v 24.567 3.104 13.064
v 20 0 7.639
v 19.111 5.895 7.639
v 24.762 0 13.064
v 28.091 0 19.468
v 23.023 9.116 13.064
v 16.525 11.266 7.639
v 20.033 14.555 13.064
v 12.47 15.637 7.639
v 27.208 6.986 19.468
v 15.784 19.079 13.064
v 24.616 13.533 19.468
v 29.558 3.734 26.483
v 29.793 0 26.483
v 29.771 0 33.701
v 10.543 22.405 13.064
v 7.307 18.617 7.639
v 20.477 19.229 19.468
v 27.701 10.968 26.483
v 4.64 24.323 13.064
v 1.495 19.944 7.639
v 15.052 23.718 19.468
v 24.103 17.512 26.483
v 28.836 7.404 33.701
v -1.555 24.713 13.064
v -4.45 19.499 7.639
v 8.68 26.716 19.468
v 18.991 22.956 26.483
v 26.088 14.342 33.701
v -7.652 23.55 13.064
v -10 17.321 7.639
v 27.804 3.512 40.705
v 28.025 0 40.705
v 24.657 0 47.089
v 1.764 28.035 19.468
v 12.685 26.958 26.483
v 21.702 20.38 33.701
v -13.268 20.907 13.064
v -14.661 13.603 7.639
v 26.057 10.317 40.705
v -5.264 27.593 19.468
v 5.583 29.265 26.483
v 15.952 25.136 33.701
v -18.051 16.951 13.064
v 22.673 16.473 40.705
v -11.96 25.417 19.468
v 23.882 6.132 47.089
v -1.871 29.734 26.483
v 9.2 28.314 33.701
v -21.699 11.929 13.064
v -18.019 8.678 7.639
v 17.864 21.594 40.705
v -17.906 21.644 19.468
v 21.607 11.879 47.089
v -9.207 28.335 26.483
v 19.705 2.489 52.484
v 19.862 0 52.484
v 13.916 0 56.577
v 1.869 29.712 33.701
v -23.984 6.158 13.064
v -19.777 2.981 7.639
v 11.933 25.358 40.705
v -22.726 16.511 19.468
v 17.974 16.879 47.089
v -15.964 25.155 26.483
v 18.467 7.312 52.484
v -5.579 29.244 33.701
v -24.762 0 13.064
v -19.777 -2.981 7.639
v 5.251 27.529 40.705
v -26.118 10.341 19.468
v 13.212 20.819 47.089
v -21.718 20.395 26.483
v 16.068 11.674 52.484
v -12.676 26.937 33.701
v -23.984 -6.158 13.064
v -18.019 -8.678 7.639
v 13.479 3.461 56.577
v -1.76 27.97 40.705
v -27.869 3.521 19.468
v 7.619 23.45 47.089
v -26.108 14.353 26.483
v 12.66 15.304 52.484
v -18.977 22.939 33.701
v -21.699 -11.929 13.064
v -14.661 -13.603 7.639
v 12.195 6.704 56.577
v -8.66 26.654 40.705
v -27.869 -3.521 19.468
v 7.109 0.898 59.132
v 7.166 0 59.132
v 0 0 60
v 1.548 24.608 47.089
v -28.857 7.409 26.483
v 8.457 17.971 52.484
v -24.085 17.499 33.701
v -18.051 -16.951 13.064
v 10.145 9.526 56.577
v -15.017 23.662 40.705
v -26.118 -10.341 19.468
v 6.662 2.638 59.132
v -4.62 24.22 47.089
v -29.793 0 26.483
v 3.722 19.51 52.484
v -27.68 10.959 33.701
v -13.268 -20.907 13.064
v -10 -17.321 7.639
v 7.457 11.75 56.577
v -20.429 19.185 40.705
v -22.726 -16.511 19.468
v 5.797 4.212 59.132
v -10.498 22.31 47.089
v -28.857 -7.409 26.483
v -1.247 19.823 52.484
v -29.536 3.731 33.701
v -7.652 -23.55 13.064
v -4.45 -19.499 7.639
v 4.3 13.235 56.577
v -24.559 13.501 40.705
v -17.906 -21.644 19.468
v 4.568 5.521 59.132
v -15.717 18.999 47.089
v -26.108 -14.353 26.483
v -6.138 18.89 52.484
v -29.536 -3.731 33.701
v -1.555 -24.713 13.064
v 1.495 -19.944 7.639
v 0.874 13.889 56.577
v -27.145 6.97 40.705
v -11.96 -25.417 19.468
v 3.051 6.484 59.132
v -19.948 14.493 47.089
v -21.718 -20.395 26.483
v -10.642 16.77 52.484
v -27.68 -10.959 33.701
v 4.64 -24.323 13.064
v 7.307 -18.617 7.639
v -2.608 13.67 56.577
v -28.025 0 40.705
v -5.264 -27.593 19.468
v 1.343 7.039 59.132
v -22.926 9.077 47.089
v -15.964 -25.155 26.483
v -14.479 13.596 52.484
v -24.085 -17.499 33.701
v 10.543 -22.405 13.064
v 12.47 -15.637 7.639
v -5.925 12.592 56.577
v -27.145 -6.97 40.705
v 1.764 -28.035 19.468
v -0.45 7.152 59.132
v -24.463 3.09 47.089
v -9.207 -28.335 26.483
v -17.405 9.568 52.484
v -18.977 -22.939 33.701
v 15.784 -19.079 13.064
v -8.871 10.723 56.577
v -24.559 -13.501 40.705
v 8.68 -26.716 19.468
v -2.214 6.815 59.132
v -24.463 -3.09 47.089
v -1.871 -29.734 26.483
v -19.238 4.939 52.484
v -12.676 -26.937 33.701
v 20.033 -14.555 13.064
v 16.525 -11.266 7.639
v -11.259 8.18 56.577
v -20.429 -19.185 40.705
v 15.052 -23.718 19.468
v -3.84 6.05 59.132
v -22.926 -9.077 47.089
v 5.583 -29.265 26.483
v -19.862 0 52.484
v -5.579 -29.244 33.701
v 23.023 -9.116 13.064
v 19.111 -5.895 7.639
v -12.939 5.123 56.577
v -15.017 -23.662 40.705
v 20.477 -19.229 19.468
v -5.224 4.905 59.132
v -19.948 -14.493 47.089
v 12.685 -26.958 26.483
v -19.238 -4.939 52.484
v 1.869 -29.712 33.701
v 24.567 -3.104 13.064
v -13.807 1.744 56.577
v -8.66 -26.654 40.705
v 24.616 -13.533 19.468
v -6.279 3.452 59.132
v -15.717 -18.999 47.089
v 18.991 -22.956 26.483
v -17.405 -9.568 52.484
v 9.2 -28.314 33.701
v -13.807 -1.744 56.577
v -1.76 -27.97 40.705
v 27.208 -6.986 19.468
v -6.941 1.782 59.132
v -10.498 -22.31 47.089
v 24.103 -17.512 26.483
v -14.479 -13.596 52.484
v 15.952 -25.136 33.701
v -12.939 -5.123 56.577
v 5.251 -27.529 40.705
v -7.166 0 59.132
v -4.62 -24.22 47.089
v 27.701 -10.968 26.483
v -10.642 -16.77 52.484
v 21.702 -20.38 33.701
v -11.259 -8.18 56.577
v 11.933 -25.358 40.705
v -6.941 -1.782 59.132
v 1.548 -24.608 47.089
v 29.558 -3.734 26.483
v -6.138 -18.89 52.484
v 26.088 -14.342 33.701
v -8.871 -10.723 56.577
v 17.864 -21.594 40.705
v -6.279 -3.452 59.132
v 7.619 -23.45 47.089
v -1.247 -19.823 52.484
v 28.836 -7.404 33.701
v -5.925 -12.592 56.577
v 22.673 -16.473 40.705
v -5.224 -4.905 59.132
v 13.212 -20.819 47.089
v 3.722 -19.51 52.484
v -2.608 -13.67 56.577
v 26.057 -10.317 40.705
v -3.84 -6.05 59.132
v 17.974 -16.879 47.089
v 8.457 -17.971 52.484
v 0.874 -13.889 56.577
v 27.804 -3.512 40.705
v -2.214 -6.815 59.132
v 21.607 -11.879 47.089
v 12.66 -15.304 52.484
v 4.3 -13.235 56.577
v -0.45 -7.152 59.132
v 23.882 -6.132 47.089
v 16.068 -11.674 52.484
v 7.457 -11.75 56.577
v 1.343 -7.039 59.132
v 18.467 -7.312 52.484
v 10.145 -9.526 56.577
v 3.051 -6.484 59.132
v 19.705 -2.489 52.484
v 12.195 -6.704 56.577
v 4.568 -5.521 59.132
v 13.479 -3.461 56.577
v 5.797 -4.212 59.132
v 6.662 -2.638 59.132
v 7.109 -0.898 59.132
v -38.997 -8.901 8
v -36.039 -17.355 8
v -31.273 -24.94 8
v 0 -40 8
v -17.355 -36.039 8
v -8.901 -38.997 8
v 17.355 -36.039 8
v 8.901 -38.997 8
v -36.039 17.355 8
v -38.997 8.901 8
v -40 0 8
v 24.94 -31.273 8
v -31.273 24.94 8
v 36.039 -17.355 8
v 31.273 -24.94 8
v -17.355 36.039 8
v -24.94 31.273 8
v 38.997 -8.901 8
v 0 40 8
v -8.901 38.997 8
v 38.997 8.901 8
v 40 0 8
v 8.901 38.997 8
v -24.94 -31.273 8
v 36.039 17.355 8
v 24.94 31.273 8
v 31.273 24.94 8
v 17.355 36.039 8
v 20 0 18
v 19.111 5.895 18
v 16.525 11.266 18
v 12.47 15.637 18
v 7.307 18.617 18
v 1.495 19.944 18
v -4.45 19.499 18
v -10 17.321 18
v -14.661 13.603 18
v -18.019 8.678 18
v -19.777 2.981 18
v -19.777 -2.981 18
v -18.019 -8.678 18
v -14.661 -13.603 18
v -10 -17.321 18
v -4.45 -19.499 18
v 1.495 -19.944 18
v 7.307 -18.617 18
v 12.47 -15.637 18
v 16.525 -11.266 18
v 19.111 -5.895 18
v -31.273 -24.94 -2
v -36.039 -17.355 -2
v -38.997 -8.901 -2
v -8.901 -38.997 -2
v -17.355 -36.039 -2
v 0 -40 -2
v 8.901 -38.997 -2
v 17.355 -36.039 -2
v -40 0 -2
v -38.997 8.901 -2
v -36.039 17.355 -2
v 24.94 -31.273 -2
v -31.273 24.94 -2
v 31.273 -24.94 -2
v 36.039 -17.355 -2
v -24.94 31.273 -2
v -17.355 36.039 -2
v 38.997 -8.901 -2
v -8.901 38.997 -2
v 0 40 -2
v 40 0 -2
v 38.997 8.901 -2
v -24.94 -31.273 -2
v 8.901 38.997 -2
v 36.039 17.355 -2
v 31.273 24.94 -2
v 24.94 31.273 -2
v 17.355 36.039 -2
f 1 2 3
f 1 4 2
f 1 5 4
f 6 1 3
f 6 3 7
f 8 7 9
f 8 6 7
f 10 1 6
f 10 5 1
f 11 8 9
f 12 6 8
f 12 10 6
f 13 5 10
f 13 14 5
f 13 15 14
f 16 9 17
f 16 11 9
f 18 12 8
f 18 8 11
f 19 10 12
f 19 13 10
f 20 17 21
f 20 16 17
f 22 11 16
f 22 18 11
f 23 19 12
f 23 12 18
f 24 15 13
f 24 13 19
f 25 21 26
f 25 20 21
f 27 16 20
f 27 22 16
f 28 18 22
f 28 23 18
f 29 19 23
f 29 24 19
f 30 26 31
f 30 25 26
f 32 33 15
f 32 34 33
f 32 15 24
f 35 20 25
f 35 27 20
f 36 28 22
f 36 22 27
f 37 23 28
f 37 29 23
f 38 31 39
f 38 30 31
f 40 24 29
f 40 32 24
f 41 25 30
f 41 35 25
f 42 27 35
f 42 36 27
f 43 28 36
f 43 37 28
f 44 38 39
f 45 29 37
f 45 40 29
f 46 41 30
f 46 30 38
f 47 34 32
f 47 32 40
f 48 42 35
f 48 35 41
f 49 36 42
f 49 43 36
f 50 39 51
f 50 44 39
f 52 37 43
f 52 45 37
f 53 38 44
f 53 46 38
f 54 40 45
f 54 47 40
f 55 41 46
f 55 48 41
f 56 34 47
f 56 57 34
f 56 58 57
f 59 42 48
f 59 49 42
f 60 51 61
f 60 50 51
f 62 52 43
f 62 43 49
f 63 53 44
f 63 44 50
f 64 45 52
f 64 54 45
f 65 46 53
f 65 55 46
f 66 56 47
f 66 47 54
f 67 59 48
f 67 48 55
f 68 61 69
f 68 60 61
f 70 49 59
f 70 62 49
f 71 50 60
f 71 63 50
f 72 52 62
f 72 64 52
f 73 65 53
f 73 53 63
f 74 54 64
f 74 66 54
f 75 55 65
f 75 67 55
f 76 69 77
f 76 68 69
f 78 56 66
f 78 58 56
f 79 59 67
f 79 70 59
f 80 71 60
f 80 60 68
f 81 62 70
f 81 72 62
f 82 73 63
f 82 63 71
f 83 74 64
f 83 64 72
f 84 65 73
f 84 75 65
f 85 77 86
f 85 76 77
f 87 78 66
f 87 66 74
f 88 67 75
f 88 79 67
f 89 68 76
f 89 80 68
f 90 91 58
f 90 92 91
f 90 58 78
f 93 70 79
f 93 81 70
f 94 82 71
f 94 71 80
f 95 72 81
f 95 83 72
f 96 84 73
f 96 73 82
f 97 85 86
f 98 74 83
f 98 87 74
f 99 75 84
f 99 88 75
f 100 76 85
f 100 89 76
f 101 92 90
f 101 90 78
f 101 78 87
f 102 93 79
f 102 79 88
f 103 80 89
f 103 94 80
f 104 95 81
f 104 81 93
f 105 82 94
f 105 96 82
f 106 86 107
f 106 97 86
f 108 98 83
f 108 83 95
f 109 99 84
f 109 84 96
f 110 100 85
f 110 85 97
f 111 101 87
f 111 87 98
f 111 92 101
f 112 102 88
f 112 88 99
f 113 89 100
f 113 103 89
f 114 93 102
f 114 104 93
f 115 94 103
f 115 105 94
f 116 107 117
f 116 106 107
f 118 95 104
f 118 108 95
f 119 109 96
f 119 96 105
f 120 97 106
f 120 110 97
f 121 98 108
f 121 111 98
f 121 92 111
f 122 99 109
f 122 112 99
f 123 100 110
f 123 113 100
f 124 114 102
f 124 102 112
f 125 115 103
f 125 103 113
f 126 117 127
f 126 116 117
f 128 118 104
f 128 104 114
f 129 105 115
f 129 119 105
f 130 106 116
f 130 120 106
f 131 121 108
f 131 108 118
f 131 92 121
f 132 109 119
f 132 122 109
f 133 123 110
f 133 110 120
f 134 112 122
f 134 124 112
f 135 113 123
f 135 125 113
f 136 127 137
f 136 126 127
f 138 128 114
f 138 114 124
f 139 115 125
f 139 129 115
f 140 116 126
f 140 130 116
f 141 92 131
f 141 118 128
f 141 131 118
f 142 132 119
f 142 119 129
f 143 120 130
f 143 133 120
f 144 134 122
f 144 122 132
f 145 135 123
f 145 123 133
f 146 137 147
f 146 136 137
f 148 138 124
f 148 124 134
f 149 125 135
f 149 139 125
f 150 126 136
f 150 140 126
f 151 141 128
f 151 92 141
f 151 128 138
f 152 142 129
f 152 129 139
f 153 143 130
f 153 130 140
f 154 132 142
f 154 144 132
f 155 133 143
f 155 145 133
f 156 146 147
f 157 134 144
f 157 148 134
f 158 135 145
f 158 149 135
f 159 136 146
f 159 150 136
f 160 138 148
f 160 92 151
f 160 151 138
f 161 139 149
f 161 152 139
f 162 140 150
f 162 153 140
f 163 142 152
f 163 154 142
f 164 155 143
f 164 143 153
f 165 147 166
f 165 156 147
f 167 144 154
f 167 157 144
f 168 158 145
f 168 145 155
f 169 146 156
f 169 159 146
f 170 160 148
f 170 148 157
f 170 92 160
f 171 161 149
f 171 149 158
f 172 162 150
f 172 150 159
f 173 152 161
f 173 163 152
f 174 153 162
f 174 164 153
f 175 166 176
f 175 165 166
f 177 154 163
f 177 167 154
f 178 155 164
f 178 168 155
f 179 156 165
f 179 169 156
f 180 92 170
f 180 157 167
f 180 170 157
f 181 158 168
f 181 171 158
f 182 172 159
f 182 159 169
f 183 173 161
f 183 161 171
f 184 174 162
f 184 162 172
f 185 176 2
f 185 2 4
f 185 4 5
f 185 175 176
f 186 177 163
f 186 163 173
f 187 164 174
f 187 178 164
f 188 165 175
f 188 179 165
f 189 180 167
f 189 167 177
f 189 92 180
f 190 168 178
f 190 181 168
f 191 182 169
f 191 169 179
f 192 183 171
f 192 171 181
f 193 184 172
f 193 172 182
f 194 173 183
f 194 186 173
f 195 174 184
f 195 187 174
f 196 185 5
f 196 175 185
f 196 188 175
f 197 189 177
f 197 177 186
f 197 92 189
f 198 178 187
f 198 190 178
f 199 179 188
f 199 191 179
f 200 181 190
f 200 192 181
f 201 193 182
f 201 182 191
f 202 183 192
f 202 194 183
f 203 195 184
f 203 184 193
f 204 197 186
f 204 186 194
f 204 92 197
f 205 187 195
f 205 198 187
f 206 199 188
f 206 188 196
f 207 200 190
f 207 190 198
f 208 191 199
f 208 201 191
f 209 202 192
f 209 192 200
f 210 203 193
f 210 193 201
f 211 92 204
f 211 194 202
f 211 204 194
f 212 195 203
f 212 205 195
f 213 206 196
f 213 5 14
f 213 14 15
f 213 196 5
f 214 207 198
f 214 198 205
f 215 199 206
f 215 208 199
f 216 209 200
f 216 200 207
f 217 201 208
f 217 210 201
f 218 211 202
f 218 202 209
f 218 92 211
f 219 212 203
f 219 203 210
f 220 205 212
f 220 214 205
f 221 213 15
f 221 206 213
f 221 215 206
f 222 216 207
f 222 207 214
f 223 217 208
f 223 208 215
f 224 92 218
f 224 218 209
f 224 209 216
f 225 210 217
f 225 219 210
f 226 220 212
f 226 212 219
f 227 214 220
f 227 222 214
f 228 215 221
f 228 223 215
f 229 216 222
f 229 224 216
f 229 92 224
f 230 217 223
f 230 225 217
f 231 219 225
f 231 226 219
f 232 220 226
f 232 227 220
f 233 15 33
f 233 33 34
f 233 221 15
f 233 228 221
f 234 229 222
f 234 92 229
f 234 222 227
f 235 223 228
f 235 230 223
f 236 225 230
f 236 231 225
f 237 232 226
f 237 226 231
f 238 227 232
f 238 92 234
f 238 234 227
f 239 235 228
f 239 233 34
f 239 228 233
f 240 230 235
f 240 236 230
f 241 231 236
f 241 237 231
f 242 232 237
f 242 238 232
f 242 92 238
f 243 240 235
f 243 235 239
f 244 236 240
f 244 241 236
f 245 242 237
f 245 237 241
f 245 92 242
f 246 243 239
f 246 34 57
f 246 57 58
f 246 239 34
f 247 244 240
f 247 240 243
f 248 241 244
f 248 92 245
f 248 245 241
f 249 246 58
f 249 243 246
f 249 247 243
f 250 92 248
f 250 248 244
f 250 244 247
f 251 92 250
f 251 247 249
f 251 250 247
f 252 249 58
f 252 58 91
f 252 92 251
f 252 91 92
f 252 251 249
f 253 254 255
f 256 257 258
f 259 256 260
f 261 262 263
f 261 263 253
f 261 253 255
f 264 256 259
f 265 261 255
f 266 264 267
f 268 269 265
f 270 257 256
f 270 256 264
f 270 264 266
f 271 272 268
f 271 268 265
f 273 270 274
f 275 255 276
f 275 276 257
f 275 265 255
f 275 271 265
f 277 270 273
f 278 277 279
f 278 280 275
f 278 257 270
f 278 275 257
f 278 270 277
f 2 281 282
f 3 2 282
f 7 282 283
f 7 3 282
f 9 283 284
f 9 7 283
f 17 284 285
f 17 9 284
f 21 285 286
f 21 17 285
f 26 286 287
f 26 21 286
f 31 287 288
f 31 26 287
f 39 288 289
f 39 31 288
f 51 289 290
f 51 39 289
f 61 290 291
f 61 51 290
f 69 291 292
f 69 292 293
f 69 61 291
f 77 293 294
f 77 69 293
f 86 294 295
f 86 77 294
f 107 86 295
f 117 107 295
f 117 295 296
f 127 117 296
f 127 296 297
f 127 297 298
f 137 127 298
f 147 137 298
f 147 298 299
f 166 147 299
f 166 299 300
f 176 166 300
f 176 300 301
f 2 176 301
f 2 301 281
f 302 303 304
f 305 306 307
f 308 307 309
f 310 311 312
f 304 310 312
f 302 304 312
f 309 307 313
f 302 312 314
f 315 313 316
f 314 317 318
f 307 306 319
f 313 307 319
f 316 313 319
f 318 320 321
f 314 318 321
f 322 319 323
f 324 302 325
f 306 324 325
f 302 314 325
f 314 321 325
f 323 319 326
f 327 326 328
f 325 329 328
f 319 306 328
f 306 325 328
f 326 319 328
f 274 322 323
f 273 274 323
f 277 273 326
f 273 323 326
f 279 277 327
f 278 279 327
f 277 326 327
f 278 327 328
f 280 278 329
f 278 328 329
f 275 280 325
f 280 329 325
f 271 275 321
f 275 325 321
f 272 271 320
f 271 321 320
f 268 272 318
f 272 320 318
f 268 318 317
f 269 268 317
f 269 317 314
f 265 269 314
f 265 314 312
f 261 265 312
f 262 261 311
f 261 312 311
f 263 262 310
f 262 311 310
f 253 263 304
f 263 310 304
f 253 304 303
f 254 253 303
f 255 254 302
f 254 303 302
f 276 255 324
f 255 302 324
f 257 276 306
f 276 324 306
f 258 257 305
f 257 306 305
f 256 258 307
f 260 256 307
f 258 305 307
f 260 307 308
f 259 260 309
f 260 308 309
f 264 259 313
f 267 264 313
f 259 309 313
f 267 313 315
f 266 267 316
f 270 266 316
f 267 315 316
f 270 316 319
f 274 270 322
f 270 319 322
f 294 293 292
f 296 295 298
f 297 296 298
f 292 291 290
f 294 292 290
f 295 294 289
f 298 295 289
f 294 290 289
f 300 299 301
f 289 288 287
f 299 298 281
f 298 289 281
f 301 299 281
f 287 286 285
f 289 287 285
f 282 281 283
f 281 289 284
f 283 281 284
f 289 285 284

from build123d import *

# Parameters (mm, degrees)
CYLINDER_R        = 20
CYLINDER_DEPTH    = 40
CYLINDER001_R     = 40
CYLINDER001_DEPTH = 10


with BuildPart() as cylinder:
    # Cylinder → Cylinder (new body)
    with BuildSketch(Plane.XY.offset(-22)):
        Circle(CYLINDER_R)
    extrude(amount=CYLINDER_DEPTH)


with BuildPart() as cut:
    # Sphere → Sphere (revolve)
    with BuildSketch(Plane(origin=(0, 0, 30), x_dir=(1, 0, 0), z_dir=(0, -1, 0))):
        with BuildLine():
            ThreePointArc((0, -30), (30, 0), (0, 30))
            Line((0, 30), (0, -30))
        make_face()
    revolve(axis=Axis((0, 0, 30), (0, 0, 1)))

    # Cut: cut Cylinder
    add(cylinder.part, mode=Mode.SUBTRACT)


with BuildPart() as cylinder001:
    # Cylinder001 → Cylinder001 (new body)
    with BuildSketch(Plane.XY.offset(-2)):
        Circle(CYLINDER001_R)
    extrude(amount=CYLINDER001_DEPTH)


solid = Compound([cut.part, cylinder001.part])
